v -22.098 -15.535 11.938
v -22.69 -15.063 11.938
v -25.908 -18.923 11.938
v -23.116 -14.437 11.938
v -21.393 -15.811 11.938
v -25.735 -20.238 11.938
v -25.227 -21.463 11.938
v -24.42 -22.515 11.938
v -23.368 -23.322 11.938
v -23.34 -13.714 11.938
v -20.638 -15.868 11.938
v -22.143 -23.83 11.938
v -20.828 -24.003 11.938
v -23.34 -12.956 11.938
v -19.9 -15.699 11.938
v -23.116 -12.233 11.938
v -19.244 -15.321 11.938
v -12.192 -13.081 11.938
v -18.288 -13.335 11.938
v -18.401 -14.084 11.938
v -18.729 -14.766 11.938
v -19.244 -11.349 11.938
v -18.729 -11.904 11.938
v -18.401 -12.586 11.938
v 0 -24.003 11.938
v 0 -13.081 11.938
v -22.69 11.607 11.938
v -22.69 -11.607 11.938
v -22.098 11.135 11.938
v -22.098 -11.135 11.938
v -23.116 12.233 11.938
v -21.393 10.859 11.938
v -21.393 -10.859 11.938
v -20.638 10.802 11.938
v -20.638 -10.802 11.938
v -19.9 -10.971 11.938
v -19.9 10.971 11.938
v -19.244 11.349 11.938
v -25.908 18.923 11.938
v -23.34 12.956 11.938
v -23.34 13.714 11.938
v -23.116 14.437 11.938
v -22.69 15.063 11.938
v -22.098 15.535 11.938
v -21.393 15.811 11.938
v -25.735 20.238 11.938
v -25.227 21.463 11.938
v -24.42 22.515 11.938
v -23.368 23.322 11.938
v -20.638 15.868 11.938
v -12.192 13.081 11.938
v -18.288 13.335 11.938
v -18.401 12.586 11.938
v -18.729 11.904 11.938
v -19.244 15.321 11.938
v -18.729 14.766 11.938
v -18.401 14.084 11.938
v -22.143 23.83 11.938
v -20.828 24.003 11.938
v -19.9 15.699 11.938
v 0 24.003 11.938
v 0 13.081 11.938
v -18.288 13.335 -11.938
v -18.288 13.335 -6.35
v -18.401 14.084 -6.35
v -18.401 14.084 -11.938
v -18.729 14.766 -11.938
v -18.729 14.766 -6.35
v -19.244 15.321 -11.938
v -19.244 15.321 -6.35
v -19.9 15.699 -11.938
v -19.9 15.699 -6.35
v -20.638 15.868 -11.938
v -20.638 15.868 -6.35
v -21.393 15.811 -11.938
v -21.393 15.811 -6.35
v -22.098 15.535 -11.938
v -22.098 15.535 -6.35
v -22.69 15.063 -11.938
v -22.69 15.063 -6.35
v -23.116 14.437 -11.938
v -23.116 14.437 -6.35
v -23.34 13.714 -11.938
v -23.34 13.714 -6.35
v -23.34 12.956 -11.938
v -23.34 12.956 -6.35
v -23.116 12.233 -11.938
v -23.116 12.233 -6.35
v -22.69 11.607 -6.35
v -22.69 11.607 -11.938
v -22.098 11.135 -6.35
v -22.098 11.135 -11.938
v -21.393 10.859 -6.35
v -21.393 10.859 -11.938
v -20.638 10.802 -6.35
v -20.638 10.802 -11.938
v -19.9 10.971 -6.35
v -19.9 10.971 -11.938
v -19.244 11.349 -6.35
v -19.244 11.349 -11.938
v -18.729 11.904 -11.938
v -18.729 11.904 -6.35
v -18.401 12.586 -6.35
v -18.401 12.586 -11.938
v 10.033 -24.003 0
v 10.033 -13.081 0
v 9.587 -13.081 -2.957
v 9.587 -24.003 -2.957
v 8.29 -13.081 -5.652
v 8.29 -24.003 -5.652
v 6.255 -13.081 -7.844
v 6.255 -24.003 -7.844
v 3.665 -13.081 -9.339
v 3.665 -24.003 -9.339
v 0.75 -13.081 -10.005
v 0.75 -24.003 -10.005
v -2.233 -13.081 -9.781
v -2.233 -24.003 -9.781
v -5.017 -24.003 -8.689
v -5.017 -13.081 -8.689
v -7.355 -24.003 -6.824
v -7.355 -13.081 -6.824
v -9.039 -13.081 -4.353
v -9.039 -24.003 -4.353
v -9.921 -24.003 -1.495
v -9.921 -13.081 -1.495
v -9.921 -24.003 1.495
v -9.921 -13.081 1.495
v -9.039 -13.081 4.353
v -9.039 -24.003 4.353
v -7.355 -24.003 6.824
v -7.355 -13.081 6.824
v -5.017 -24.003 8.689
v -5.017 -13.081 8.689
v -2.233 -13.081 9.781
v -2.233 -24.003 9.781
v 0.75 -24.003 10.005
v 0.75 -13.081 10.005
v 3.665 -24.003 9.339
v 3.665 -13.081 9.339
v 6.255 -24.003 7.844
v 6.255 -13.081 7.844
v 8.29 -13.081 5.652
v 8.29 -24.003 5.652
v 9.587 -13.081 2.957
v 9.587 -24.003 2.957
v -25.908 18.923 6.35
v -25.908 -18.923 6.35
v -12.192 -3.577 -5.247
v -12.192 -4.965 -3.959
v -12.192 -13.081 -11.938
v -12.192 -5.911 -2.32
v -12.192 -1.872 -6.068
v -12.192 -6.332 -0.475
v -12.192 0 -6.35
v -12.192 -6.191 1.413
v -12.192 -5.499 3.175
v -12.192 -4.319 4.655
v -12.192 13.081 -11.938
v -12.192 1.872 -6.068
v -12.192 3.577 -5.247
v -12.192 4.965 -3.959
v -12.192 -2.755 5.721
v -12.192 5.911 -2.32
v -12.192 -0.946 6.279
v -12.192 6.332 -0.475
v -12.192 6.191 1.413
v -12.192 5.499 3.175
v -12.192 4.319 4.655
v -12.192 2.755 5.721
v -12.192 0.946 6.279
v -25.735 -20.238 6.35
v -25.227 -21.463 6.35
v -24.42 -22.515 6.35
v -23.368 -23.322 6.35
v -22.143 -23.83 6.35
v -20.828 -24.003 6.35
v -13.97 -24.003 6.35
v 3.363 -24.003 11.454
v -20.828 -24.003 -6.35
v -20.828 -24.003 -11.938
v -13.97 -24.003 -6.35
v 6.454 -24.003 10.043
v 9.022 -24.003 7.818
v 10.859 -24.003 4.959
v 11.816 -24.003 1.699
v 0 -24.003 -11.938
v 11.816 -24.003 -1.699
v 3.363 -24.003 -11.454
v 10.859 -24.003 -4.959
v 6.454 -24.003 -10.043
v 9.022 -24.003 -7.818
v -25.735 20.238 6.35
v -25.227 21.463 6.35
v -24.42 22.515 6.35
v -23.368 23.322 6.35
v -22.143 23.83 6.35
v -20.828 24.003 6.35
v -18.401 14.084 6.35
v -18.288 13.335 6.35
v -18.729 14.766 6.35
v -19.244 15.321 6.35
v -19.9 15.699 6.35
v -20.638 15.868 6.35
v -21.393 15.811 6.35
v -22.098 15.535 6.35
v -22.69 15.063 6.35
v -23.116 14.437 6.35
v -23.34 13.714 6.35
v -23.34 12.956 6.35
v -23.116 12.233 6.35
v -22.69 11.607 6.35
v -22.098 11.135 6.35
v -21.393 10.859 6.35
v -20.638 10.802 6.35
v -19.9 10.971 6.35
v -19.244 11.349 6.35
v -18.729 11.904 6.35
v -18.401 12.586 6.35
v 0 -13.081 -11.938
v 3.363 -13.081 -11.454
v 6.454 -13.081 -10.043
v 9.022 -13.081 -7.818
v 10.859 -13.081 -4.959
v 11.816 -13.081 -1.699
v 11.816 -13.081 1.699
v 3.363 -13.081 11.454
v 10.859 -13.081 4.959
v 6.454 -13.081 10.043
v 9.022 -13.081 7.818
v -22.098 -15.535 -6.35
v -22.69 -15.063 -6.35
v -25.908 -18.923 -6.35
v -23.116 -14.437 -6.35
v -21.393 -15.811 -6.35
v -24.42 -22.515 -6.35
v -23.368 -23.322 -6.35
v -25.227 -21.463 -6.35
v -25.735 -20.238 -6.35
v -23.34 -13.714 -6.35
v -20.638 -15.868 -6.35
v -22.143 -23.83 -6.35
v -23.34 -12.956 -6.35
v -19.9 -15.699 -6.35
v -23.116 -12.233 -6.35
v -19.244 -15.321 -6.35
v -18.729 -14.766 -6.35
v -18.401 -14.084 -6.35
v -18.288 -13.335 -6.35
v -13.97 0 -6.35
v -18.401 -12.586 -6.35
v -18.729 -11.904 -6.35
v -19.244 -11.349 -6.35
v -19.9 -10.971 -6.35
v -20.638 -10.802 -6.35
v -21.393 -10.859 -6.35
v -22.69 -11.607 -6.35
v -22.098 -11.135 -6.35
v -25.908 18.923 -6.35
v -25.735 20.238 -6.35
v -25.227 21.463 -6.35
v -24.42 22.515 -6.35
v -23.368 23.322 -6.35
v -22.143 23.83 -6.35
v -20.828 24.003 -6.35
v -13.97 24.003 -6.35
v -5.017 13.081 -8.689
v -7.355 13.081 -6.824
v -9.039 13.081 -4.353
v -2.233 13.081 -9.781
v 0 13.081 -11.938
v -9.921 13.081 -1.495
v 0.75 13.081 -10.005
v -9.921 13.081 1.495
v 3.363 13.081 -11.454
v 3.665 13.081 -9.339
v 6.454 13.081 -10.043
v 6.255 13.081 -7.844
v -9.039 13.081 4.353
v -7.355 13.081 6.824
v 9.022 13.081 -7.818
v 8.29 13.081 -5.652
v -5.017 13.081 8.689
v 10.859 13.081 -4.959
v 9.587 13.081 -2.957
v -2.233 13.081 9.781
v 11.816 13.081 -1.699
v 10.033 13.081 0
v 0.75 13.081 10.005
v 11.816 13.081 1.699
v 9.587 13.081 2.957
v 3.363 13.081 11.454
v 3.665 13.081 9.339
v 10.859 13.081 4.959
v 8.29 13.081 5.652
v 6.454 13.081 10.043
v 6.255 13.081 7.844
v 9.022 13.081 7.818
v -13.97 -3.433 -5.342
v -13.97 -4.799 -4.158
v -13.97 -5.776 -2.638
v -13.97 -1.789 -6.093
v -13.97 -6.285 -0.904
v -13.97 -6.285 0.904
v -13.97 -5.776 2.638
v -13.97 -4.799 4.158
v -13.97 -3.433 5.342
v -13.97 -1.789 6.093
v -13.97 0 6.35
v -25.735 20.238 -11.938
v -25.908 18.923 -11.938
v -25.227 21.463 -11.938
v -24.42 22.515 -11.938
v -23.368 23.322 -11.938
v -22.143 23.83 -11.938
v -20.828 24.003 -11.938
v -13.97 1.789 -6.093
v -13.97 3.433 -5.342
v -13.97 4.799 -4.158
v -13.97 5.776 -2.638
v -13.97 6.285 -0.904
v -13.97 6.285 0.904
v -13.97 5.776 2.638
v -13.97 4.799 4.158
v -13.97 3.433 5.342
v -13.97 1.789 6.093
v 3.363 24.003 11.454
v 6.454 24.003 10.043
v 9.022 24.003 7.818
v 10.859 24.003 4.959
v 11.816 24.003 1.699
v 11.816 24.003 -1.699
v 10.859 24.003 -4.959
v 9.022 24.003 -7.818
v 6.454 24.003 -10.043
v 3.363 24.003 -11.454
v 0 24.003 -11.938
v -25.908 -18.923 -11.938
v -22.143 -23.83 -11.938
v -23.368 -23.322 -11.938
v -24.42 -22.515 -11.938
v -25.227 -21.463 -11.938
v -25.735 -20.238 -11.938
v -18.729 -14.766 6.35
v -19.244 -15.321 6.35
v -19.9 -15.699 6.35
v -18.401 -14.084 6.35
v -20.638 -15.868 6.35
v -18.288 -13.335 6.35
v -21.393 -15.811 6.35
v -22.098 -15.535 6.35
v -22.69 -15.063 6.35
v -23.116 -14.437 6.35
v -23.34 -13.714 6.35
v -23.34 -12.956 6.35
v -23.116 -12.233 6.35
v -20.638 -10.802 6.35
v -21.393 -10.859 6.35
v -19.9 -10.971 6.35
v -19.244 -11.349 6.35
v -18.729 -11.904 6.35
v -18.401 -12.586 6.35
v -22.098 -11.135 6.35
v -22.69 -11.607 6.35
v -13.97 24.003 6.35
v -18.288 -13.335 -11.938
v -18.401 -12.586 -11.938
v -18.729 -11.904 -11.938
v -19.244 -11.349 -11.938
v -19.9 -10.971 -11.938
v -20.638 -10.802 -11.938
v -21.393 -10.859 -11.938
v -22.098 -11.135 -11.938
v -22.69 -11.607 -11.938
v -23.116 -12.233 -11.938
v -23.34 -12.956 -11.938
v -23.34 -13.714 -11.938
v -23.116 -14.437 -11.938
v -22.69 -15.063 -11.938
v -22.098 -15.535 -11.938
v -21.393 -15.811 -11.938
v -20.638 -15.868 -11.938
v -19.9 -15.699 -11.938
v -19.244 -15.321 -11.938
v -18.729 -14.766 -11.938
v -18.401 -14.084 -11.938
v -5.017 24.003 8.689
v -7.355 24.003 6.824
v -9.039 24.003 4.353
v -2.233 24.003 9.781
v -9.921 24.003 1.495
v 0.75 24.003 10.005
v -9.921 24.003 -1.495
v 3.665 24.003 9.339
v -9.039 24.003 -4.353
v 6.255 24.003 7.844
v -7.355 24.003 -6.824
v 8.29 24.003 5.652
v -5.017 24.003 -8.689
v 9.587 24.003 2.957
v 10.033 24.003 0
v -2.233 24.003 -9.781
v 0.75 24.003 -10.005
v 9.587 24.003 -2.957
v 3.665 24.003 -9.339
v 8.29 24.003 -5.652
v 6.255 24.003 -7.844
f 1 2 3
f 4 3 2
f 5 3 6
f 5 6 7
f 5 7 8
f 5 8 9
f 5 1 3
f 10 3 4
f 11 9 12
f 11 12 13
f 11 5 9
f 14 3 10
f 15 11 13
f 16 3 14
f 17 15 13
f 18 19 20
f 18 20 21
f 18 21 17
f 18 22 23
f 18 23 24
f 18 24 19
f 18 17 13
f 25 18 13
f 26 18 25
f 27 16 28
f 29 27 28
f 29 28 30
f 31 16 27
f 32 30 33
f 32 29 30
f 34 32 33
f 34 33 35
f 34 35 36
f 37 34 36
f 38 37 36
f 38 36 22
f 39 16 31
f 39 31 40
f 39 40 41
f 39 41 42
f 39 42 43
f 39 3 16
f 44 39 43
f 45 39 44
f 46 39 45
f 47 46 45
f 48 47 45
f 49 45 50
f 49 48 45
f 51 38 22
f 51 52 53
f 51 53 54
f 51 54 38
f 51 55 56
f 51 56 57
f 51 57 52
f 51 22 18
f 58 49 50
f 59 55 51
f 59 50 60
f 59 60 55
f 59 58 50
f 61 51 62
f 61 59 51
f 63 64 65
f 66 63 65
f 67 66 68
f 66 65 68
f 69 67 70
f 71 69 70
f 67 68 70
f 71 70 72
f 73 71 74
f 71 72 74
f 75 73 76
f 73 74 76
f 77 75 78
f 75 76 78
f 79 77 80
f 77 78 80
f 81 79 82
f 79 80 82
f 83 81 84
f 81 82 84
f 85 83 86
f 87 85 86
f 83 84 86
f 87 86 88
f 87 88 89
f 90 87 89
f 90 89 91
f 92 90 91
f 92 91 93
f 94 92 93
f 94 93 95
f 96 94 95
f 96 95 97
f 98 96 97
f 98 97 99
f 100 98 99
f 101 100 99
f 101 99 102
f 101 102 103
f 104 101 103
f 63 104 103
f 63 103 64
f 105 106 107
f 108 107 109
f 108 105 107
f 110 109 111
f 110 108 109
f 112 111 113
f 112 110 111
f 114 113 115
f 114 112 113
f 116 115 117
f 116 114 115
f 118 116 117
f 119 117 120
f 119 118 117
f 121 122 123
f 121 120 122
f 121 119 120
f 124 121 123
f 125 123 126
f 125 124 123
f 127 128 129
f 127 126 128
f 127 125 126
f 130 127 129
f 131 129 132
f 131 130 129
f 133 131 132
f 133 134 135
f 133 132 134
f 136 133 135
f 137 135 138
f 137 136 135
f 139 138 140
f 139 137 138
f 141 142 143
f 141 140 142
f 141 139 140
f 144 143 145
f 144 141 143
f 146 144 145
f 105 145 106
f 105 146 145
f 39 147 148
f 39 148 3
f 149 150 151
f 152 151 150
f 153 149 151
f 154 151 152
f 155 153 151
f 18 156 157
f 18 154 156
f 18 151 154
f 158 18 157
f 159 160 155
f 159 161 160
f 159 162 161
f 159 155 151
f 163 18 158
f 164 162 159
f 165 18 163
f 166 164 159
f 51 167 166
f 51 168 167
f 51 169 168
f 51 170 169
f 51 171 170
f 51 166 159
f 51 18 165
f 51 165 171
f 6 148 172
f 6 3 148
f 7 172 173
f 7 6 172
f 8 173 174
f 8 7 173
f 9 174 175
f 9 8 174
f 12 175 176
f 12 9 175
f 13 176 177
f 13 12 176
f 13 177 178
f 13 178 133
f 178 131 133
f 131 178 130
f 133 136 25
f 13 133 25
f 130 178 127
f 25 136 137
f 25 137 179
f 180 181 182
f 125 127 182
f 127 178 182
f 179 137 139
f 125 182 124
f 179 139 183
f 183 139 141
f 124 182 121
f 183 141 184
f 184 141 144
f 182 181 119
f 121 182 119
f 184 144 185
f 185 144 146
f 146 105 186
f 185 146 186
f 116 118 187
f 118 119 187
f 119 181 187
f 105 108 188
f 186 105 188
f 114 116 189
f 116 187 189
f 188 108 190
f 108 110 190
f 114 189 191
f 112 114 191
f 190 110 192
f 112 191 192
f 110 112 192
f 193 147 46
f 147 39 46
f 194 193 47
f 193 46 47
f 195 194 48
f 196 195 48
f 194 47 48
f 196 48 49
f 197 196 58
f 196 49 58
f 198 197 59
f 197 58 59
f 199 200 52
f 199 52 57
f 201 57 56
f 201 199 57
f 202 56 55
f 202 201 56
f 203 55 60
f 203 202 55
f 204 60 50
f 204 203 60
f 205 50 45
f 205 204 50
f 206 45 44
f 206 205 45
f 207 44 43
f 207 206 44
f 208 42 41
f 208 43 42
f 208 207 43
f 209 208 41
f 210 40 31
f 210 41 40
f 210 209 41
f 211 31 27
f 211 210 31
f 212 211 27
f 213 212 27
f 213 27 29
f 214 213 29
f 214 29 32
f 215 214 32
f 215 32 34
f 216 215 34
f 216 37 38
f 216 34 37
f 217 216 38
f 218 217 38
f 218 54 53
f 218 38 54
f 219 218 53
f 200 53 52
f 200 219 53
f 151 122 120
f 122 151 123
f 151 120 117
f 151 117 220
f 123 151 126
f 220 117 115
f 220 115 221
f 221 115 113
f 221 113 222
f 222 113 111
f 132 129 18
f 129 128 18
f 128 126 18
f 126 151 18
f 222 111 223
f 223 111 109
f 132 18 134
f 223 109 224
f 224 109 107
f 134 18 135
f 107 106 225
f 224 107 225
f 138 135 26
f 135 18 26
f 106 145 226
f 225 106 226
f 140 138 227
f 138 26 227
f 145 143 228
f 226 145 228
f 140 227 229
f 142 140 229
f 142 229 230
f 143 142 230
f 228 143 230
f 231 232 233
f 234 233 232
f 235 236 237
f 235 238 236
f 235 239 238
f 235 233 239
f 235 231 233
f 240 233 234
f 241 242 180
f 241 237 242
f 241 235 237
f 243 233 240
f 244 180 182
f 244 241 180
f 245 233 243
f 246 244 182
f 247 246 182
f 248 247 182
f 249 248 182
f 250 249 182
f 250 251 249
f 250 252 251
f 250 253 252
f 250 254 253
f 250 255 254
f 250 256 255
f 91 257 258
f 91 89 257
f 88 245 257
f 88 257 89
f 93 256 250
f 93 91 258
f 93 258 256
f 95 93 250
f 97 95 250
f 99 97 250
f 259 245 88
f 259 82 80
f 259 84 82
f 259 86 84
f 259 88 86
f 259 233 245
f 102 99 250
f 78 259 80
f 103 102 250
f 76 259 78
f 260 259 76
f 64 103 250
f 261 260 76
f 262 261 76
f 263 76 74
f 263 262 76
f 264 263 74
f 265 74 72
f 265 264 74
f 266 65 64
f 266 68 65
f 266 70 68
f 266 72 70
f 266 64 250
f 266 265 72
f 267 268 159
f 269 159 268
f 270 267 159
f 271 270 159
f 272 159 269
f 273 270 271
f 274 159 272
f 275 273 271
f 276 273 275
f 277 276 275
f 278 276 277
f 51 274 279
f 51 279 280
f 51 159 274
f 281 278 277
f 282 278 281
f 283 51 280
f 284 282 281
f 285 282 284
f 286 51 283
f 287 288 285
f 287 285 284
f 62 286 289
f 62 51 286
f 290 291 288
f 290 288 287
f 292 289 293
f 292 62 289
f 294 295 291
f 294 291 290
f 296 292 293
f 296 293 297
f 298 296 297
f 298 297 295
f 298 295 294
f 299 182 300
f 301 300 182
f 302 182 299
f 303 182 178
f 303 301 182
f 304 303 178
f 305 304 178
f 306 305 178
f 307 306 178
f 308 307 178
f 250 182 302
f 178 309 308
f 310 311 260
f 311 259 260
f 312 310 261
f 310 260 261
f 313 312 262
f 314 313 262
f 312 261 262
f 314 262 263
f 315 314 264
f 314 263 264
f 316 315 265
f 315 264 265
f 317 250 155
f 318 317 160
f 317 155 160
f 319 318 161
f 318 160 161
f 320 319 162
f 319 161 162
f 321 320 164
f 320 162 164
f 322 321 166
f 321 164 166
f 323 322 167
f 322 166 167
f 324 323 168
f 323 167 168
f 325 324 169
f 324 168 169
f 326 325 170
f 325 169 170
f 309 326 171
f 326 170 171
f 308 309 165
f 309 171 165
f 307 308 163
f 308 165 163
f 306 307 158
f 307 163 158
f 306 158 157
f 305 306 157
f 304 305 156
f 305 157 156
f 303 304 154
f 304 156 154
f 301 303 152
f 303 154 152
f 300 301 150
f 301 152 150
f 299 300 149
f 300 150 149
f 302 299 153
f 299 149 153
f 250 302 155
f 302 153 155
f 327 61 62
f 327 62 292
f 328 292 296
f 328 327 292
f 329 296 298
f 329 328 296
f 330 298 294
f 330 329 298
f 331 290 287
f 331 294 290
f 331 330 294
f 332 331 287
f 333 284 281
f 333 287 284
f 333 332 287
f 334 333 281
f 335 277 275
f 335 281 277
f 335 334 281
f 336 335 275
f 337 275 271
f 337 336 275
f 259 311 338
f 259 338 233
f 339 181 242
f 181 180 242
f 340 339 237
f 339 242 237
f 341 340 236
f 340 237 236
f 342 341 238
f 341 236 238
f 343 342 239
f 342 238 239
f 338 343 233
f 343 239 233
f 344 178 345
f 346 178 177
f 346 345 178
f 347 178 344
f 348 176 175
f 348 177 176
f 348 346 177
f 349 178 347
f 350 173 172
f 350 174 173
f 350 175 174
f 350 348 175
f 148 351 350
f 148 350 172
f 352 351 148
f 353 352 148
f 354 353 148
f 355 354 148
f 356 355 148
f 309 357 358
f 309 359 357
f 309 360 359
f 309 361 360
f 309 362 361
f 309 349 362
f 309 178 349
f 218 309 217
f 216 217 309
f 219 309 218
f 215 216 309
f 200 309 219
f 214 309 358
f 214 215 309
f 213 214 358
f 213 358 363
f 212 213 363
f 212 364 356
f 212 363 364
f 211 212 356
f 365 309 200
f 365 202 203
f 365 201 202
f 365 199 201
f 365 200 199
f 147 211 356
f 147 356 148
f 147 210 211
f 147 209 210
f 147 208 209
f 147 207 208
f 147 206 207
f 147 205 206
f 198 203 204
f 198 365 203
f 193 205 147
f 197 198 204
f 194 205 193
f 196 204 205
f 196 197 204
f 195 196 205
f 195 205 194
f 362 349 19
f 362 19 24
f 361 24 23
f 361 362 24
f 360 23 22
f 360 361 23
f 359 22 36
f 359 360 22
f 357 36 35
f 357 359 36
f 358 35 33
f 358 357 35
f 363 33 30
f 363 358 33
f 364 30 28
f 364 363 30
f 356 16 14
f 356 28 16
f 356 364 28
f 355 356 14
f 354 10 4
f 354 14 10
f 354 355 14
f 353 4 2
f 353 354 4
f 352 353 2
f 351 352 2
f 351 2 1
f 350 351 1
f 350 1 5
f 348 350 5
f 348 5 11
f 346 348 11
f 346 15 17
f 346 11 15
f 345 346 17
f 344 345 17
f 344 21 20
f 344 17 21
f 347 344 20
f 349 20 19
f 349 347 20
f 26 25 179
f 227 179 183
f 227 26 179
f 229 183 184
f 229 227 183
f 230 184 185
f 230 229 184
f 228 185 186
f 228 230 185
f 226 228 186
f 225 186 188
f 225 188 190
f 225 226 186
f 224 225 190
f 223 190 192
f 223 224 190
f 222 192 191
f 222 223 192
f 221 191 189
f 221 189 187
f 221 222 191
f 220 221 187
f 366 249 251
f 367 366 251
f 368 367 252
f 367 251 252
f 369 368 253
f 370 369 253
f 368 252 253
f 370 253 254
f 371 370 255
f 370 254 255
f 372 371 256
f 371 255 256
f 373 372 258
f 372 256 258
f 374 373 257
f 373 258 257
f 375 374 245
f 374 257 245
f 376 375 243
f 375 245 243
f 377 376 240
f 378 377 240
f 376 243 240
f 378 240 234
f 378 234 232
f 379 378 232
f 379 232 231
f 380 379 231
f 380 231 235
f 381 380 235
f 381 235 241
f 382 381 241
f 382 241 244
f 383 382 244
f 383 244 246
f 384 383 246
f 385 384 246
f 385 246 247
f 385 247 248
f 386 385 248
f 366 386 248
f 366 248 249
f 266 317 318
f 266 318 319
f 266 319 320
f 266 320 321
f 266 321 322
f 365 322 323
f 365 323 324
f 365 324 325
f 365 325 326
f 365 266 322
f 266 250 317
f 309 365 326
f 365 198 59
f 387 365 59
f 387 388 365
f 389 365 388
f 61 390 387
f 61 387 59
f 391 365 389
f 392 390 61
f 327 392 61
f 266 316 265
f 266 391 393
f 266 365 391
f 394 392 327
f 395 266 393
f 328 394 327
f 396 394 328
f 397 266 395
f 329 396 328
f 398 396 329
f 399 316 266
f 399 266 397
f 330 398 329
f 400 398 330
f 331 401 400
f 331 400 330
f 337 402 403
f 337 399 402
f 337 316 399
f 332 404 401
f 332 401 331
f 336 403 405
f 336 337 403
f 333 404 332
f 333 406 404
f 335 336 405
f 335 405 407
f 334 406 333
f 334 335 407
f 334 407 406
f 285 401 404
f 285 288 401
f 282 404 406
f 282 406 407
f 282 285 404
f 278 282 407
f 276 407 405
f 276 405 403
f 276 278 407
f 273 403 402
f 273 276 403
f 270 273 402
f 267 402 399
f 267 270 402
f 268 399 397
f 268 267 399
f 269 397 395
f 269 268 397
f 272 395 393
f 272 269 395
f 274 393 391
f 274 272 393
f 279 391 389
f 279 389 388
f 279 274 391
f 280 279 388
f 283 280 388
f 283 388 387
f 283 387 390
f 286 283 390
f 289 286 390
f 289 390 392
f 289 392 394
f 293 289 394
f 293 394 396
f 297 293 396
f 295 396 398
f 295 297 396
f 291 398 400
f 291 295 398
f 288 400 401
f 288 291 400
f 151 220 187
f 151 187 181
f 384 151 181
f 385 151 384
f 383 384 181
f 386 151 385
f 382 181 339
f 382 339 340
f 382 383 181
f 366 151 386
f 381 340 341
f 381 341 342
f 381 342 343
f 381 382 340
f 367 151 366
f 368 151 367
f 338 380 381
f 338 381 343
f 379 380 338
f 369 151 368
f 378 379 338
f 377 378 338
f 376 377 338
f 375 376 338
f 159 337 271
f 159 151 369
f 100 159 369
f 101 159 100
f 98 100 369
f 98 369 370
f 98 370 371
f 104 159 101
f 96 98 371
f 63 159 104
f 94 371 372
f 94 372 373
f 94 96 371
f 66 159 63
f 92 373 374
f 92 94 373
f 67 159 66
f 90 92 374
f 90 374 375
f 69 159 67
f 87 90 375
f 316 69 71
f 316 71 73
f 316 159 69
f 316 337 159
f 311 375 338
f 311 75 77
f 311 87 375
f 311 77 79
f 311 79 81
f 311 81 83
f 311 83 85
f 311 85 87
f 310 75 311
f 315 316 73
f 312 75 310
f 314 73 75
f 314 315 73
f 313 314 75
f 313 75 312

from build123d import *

# Parameters (mm, degrees)
SKETCH1_R               = 10.033
BOSS_EXTRUDE1_DEPTH     = 24.003
SKETCH3_R               = 2.54
SKETCH3_W               = 24.13
SKETCH3_H               = 26.162
CUT_EXTRUDE1_DEPTH      = 12.938
CUT_EXTRUDE1_DEPTH_BACK = 12.938
SKETCH5_R               = 6.35
CUT_EXTRUDE2_DEPTH      = 26.908
FILLET1_R               = 5.08


with BuildPart() as part:
    # Sketch1 → Boss-Extrude1 (new body, symmetric)
    with BuildSketch(Plane(origin=(0, 0, 0), x_dir=(1, 0, 0), z_dir=(0, 1, 0))):
        with BuildLine():
            Line((0, 11.938), (-25.908, 11.938))
            Line((-25.908, 11.938), (-25.908, 6.35))
            Line((-25.908, 6.35), (-13.97, 6.35))
            Line((-13.97, 6.35), (-13.97, -6.35))
            Line((-13.97, -6.35), (-25.908, -6.35))
            Line((-25.908, -6.35), (-25.908, -11.938))
            Line((-25.908, -11.938), (0, -11.938))
            ThreePointArc((0, -11.938), (11.938, 0), (0, 11.938))
        make_face()
        Circle(SKETCH1_R, mode=Mode.SUBTRACT)
    extrude(amount=BOSS_EXTRUDE1_DEPTH, both=True)

    # Sketch3 → Cut-Extrude1 (cut, two sides)
    with BuildSketch(Plane.XY) as cut_extrude1_sk:
        with Locations((-20.828, 13.335)):
            Circle(SKETCH3_R)
        with Locations((-20.828, -13.335)):
            Circle(SKETCH3_R)
        with Locations((-0.127, 0)):
            Rectangle(SKETCH3_W, SKETCH3_H)
    extrude(amount=CUT_EXTRUDE1_DEPTH, mode=Mode.SUBTRACT)
    extrude(cut_extrude1_sk.sketch, amount=-CUT_EXTRUDE1_DEPTH_BACK, mode=Mode.SUBTRACT)

    # Sketch5 → Cut-Extrude2 (cut, through all)
    with BuildSketch(Plane(origin=(0, 0, 0), x_dir=(0, 0, -1), z_dir=(1, 0, 0))):
        Circle(SKETCH5_R)
    extrude(amount=-CUT_EXTRUDE2_DEPTH, mode=Mode.SUBTRACT)

    # Fillet1
    fillet1_edges = [part.edges().sort_by_distance(p)[0] for p in [
        (-25.908, 24.003, -9.144),
        (-25.908, 24.003, 9.144),
        (-25.908, -24.003, 9.144),
        (-25.908, -24.003, -9.144),
    ]]
    fillet(fillet1_edges, radius=FILLET1_R)


solid = part.part
